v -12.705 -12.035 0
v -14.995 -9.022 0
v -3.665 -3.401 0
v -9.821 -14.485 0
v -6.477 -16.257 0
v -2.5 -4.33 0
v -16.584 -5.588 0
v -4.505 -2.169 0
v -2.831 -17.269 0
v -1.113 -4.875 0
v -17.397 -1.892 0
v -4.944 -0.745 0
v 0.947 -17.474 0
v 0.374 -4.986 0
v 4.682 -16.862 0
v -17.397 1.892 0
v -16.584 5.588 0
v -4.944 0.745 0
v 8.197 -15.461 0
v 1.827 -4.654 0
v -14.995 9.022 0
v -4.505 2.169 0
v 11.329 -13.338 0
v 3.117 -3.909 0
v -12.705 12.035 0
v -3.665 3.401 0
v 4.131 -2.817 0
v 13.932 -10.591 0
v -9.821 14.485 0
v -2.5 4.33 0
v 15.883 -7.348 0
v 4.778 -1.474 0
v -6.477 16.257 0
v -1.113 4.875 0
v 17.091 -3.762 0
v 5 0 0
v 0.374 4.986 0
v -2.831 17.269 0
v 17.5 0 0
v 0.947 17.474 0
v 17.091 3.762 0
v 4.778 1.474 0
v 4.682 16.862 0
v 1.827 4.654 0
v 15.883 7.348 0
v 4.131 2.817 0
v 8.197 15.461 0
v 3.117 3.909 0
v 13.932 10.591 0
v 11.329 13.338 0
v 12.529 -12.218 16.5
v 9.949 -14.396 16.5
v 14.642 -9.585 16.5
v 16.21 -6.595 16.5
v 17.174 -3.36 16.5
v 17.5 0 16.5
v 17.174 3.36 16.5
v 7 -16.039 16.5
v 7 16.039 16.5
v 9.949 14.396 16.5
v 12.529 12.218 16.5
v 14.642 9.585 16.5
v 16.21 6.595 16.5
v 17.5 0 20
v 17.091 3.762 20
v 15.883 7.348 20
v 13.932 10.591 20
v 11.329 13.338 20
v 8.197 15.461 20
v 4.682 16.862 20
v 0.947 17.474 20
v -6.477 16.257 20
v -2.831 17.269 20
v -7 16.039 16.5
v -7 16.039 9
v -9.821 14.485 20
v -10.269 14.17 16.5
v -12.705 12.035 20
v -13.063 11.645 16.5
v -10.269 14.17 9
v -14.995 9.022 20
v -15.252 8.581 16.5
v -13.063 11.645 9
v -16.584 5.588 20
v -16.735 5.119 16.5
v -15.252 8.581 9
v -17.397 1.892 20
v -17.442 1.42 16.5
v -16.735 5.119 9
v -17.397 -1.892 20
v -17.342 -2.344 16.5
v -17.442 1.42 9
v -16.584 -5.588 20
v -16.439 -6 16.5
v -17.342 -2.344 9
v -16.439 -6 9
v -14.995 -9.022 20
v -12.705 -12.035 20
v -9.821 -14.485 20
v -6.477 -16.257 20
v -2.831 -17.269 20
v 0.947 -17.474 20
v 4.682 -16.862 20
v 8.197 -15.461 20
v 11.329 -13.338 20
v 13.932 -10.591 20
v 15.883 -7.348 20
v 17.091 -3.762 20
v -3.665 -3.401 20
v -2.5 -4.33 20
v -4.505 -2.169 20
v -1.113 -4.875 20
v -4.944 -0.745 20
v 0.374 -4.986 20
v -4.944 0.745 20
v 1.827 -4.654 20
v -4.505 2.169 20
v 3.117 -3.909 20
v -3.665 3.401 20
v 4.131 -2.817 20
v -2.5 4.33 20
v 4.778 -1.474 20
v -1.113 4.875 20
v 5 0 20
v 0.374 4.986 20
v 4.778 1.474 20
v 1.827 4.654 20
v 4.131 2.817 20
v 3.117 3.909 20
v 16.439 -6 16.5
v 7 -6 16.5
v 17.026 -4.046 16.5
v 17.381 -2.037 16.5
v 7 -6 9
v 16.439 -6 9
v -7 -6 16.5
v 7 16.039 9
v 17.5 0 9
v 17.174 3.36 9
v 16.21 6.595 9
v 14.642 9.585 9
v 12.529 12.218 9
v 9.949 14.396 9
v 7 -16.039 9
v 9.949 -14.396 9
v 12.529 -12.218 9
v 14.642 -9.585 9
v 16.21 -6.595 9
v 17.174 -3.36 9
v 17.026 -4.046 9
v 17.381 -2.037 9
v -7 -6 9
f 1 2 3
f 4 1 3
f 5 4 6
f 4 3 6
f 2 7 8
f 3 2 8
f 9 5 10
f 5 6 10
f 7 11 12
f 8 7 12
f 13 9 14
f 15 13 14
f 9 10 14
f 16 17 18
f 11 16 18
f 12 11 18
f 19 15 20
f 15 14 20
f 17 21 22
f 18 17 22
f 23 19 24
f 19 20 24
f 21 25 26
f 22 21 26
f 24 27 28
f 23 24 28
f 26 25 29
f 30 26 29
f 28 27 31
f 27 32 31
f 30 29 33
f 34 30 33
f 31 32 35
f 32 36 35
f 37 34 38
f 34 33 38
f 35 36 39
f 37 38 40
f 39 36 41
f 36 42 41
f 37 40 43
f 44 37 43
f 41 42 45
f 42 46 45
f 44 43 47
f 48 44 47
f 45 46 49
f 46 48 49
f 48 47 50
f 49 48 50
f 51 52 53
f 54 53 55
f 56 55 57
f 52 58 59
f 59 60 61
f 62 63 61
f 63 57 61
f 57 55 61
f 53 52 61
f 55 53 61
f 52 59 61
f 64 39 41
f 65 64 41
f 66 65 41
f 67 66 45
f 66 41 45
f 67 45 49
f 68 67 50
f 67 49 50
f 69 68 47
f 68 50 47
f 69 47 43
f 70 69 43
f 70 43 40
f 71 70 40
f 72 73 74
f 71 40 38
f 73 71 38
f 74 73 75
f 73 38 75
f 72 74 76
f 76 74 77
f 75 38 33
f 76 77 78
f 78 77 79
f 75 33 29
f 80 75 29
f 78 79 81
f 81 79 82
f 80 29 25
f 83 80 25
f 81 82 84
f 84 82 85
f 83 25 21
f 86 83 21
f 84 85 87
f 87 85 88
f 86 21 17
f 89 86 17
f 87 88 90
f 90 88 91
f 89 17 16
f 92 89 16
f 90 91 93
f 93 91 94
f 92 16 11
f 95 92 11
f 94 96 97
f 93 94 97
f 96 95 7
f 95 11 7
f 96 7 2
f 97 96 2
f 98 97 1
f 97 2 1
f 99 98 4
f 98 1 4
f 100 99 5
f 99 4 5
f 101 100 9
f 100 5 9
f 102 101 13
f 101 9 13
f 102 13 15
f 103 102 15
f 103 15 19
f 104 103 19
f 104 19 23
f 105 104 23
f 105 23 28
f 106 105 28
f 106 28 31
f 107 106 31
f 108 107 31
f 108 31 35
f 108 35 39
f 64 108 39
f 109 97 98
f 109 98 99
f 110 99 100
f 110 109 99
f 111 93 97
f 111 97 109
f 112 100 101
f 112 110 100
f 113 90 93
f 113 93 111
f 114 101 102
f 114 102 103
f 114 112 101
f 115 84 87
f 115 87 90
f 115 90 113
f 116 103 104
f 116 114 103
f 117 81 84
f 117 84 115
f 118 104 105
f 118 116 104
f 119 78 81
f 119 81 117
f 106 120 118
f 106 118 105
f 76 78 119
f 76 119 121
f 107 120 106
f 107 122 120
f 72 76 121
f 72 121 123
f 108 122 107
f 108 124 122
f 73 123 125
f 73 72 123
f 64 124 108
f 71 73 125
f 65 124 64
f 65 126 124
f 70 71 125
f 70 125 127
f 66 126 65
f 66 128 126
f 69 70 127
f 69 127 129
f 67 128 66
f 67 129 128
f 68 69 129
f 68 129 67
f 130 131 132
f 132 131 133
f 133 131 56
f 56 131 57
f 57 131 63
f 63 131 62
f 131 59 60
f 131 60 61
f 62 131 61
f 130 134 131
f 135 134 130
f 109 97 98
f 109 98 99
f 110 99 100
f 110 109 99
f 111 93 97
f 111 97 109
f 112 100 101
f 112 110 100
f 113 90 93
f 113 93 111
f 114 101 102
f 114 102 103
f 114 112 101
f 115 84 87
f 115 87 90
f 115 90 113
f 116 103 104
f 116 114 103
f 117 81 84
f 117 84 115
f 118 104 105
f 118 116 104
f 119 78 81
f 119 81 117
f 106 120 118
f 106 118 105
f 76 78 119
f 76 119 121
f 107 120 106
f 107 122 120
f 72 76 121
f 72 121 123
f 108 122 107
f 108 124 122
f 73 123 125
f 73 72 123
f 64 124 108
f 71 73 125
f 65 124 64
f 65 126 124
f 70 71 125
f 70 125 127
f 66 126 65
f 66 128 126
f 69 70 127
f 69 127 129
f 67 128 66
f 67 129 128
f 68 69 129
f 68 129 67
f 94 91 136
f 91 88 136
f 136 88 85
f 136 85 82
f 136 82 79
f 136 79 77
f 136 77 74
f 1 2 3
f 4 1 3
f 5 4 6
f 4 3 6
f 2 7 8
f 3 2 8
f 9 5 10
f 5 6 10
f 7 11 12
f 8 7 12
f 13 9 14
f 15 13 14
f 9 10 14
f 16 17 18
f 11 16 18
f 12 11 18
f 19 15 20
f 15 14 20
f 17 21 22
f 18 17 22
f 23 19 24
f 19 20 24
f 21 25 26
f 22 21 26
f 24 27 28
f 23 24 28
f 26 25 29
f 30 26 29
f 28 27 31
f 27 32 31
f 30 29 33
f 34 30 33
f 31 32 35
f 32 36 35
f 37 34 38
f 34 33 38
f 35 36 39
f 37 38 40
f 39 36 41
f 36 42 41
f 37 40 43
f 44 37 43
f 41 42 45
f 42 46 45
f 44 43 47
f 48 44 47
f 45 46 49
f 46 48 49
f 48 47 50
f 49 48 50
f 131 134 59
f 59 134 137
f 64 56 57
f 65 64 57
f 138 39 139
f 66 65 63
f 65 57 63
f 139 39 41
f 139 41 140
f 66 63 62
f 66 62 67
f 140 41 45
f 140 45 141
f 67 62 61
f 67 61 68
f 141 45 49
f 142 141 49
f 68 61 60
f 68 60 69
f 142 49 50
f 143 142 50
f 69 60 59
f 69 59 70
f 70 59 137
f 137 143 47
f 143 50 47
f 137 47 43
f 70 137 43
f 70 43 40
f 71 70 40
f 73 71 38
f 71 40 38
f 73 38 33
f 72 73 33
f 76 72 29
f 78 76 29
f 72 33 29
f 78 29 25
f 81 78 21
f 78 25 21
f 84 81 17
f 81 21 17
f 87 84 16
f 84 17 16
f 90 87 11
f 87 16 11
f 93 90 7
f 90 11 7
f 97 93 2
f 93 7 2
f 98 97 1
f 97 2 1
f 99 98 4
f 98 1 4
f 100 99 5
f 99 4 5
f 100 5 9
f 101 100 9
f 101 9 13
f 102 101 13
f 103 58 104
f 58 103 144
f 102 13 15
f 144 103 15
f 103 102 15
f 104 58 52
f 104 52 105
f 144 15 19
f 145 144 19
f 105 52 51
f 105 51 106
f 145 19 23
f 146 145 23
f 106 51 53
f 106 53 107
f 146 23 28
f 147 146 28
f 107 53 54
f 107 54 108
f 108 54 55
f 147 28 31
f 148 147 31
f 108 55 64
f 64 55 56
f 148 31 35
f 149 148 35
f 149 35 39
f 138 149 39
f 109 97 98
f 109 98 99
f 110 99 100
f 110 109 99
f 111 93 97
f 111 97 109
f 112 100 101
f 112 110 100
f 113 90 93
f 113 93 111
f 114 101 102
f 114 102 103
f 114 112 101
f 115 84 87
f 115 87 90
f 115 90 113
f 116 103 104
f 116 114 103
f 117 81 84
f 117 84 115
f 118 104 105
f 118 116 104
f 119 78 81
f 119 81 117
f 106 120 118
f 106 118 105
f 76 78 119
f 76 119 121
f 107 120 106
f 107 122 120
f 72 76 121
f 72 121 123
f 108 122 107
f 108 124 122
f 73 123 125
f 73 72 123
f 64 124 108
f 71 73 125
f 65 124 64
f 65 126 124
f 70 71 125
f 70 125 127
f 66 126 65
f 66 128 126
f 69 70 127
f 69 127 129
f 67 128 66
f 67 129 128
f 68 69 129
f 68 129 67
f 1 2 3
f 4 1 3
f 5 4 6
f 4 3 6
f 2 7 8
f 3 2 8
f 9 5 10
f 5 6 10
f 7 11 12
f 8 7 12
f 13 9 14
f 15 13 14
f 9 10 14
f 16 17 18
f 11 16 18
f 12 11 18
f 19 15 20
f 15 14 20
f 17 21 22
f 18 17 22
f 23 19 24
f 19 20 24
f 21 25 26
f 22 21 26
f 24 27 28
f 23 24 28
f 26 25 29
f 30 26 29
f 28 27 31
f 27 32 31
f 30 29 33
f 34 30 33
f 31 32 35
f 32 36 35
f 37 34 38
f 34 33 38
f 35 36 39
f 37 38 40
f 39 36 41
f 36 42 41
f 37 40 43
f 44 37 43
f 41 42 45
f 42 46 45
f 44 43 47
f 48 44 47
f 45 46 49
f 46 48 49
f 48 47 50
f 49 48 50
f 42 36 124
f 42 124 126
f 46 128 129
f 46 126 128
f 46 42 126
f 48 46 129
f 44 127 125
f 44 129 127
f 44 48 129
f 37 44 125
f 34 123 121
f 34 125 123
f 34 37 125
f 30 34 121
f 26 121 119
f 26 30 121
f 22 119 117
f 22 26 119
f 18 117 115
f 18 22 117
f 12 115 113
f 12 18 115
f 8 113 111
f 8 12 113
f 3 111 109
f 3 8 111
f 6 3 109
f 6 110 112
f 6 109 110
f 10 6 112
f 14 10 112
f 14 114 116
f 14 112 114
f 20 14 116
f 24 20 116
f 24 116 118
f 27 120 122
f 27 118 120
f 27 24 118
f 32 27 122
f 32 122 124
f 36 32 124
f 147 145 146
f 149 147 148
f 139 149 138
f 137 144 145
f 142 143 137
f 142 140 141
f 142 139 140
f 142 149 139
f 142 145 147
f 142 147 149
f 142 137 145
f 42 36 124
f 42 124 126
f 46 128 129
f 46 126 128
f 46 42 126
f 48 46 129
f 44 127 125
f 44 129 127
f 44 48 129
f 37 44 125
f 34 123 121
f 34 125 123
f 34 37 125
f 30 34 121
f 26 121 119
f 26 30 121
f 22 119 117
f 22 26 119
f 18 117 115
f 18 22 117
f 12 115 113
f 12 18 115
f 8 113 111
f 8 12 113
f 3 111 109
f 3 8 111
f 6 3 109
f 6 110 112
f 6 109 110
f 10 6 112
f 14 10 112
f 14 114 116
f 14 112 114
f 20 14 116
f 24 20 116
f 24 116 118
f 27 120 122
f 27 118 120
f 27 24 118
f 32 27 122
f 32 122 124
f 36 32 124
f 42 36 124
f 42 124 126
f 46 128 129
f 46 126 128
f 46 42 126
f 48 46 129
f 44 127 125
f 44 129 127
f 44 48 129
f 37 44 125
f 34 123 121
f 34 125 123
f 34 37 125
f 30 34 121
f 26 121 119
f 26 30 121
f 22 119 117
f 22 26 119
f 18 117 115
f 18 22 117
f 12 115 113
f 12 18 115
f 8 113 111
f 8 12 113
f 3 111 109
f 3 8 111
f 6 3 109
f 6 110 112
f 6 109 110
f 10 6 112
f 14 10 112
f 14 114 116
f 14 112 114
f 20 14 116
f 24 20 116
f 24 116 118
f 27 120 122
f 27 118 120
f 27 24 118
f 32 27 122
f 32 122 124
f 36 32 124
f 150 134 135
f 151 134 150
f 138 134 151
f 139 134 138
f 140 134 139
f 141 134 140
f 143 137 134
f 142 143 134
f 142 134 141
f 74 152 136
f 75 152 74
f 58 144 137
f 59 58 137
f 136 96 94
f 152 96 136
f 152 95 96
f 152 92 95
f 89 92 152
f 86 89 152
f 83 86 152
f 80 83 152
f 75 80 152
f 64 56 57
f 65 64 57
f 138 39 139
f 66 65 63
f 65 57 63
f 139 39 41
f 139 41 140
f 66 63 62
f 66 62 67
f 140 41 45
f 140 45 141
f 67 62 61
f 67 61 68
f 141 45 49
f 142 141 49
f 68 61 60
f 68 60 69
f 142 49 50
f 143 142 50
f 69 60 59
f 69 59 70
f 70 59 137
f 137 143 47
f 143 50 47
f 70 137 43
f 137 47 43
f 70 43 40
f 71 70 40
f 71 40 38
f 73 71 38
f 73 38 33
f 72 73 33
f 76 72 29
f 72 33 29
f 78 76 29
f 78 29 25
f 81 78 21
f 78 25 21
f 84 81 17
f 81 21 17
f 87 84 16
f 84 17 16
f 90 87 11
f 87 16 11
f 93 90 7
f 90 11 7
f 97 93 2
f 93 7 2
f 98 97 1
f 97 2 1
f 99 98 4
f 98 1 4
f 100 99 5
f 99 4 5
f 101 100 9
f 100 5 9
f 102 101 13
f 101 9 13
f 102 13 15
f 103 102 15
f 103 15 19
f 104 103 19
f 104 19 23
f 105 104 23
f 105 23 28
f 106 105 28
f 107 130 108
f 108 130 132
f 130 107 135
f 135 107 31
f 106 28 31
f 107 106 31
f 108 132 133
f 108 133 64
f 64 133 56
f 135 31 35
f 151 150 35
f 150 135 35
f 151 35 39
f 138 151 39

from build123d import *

# Parameters (mm, degrees)
BOX_W             = 30
BOX_H             = 30
BOX_DEPTH         = 7.5
CYLINDER001_R     = 5
CYLINDER001_DEPTH = 40
CYLINDER_R        = 17.5
CYLINDER_DEPTH    = 20
BOX001_W          = 30
BOX001_H          = 70
BOX001_DEPTH      = 7.5
CYLINDER003_R     = 5
CYLINDER003_DEPTH = 40
CYLINDER002_R     = 17.5
CYLINDER002_DEPTH = 20
BOX002_W          = 30
BOX002_H          = 30
BOX002_DEPTH      = 7.5
CYLINDER005_R     = 5
CYLINDER005_DEPTH = 40
CYLINDER004_R     = 17.5
CYLINDER004_DEPTH = 20


with BuildPart() as cube:
    # Box → Box (new body)
    with BuildSketch(Plane(origin=(7, -6, 9), x_dir=(1, 0, 0), z_dir=(0, 0, 1))):
        with Locations((15, 15)):
            Rectangle(BOX_W, BOX_H)
    extrude(amount=BOX_DEPTH)


with BuildPart() as cylinder001:
    # Cylinder001 → Cylinder001 (new body)
    with BuildSketch(Plane.XY.offset(-10)):
        Circle(CYLINDER001_R)
    extrude(amount=CYLINDER001_DEPTH)


with BuildPart() as mount_bottom_r:
    # Cylinder → Cylinder (new body)
    with BuildSketch(Plane.XY):
        Circle(CYLINDER_R)
    extrude(amount=CYLINDER_DEPTH)

    # Cut: cut Cylinder001
    add(cylinder001.part, mode=Mode.SUBTRACT)

    # Cut001: cut Cube
    add(cube.part, mode=Mode.SUBTRACT)


with BuildPart() as cube001:
    # Box001 → Box001 (new body)
    with BuildSketch(Plane(origin=(7, -20, 9), x_dir=(1, 0, 0), z_dir=(0, 0, 1))):
        with Locations((15, 35)):
            Rectangle(BOX001_W, BOX001_H)
    extrude(amount=BOX001_DEPTH)


with BuildPart() as cylinder003:
    # Cylinder003 → Cylinder003 (new body)
    with BuildSketch(Plane.XY.offset(-10)):
        Circle(CYLINDER003_R)
    extrude(amount=CYLINDER003_DEPTH)


with BuildPart() as mount_top_l_r:
    # Cylinder002 → Cylinder002 (new body)
    with BuildSketch(Plane.XY):
        Circle(CYLINDER002_R)
    extrude(amount=CYLINDER002_DEPTH)

    # Cut002: cut Cylinder003
    add(cylinder003.part, mode=Mode.SUBTRACT)

    # Cut003: cut Cube001
    add(cube001.part, mode=Mode.SUBTRACT)


with BuildPart() as cube002:
    # Box002 → Box002 (new body)
    with BuildSketch(Plane(origin=(-37, -6, 9), x_dir=(1, 0, 0), z_dir=(0, 0, 1))):
        with Locations((15, 15)):
            Rectangle(BOX002_W, BOX002_H)
    extrude(amount=BOX002_DEPTH)


with BuildPart() as cylinder005:
    # Cylinder005 → Cylinder005 (new body)
    with BuildSketch(Plane.XY.offset(-10)):
        Circle(CYLINDER005_R)
    extrude(amount=CYLINDER005_DEPTH)


with BuildPart() as mount_bottom_l:
    # Cylinder004 → Cylinder004 (new body)
    with BuildSketch(Plane.XY):
        Circle(CYLINDER004_R)
    extrude(amount=CYLINDER004_DEPTH)

    # Cut004: cut Cylinder005
    add(cylinder005.part, mode=Mode.SUBTRACT)

    # Cut005: cut Cube002
    add(cube002.part, mode=Mode.SUBTRACT)


solid = Compound([mount_bottom_r.part, mount_top_l_r.part, mount_bottom_l.part])
